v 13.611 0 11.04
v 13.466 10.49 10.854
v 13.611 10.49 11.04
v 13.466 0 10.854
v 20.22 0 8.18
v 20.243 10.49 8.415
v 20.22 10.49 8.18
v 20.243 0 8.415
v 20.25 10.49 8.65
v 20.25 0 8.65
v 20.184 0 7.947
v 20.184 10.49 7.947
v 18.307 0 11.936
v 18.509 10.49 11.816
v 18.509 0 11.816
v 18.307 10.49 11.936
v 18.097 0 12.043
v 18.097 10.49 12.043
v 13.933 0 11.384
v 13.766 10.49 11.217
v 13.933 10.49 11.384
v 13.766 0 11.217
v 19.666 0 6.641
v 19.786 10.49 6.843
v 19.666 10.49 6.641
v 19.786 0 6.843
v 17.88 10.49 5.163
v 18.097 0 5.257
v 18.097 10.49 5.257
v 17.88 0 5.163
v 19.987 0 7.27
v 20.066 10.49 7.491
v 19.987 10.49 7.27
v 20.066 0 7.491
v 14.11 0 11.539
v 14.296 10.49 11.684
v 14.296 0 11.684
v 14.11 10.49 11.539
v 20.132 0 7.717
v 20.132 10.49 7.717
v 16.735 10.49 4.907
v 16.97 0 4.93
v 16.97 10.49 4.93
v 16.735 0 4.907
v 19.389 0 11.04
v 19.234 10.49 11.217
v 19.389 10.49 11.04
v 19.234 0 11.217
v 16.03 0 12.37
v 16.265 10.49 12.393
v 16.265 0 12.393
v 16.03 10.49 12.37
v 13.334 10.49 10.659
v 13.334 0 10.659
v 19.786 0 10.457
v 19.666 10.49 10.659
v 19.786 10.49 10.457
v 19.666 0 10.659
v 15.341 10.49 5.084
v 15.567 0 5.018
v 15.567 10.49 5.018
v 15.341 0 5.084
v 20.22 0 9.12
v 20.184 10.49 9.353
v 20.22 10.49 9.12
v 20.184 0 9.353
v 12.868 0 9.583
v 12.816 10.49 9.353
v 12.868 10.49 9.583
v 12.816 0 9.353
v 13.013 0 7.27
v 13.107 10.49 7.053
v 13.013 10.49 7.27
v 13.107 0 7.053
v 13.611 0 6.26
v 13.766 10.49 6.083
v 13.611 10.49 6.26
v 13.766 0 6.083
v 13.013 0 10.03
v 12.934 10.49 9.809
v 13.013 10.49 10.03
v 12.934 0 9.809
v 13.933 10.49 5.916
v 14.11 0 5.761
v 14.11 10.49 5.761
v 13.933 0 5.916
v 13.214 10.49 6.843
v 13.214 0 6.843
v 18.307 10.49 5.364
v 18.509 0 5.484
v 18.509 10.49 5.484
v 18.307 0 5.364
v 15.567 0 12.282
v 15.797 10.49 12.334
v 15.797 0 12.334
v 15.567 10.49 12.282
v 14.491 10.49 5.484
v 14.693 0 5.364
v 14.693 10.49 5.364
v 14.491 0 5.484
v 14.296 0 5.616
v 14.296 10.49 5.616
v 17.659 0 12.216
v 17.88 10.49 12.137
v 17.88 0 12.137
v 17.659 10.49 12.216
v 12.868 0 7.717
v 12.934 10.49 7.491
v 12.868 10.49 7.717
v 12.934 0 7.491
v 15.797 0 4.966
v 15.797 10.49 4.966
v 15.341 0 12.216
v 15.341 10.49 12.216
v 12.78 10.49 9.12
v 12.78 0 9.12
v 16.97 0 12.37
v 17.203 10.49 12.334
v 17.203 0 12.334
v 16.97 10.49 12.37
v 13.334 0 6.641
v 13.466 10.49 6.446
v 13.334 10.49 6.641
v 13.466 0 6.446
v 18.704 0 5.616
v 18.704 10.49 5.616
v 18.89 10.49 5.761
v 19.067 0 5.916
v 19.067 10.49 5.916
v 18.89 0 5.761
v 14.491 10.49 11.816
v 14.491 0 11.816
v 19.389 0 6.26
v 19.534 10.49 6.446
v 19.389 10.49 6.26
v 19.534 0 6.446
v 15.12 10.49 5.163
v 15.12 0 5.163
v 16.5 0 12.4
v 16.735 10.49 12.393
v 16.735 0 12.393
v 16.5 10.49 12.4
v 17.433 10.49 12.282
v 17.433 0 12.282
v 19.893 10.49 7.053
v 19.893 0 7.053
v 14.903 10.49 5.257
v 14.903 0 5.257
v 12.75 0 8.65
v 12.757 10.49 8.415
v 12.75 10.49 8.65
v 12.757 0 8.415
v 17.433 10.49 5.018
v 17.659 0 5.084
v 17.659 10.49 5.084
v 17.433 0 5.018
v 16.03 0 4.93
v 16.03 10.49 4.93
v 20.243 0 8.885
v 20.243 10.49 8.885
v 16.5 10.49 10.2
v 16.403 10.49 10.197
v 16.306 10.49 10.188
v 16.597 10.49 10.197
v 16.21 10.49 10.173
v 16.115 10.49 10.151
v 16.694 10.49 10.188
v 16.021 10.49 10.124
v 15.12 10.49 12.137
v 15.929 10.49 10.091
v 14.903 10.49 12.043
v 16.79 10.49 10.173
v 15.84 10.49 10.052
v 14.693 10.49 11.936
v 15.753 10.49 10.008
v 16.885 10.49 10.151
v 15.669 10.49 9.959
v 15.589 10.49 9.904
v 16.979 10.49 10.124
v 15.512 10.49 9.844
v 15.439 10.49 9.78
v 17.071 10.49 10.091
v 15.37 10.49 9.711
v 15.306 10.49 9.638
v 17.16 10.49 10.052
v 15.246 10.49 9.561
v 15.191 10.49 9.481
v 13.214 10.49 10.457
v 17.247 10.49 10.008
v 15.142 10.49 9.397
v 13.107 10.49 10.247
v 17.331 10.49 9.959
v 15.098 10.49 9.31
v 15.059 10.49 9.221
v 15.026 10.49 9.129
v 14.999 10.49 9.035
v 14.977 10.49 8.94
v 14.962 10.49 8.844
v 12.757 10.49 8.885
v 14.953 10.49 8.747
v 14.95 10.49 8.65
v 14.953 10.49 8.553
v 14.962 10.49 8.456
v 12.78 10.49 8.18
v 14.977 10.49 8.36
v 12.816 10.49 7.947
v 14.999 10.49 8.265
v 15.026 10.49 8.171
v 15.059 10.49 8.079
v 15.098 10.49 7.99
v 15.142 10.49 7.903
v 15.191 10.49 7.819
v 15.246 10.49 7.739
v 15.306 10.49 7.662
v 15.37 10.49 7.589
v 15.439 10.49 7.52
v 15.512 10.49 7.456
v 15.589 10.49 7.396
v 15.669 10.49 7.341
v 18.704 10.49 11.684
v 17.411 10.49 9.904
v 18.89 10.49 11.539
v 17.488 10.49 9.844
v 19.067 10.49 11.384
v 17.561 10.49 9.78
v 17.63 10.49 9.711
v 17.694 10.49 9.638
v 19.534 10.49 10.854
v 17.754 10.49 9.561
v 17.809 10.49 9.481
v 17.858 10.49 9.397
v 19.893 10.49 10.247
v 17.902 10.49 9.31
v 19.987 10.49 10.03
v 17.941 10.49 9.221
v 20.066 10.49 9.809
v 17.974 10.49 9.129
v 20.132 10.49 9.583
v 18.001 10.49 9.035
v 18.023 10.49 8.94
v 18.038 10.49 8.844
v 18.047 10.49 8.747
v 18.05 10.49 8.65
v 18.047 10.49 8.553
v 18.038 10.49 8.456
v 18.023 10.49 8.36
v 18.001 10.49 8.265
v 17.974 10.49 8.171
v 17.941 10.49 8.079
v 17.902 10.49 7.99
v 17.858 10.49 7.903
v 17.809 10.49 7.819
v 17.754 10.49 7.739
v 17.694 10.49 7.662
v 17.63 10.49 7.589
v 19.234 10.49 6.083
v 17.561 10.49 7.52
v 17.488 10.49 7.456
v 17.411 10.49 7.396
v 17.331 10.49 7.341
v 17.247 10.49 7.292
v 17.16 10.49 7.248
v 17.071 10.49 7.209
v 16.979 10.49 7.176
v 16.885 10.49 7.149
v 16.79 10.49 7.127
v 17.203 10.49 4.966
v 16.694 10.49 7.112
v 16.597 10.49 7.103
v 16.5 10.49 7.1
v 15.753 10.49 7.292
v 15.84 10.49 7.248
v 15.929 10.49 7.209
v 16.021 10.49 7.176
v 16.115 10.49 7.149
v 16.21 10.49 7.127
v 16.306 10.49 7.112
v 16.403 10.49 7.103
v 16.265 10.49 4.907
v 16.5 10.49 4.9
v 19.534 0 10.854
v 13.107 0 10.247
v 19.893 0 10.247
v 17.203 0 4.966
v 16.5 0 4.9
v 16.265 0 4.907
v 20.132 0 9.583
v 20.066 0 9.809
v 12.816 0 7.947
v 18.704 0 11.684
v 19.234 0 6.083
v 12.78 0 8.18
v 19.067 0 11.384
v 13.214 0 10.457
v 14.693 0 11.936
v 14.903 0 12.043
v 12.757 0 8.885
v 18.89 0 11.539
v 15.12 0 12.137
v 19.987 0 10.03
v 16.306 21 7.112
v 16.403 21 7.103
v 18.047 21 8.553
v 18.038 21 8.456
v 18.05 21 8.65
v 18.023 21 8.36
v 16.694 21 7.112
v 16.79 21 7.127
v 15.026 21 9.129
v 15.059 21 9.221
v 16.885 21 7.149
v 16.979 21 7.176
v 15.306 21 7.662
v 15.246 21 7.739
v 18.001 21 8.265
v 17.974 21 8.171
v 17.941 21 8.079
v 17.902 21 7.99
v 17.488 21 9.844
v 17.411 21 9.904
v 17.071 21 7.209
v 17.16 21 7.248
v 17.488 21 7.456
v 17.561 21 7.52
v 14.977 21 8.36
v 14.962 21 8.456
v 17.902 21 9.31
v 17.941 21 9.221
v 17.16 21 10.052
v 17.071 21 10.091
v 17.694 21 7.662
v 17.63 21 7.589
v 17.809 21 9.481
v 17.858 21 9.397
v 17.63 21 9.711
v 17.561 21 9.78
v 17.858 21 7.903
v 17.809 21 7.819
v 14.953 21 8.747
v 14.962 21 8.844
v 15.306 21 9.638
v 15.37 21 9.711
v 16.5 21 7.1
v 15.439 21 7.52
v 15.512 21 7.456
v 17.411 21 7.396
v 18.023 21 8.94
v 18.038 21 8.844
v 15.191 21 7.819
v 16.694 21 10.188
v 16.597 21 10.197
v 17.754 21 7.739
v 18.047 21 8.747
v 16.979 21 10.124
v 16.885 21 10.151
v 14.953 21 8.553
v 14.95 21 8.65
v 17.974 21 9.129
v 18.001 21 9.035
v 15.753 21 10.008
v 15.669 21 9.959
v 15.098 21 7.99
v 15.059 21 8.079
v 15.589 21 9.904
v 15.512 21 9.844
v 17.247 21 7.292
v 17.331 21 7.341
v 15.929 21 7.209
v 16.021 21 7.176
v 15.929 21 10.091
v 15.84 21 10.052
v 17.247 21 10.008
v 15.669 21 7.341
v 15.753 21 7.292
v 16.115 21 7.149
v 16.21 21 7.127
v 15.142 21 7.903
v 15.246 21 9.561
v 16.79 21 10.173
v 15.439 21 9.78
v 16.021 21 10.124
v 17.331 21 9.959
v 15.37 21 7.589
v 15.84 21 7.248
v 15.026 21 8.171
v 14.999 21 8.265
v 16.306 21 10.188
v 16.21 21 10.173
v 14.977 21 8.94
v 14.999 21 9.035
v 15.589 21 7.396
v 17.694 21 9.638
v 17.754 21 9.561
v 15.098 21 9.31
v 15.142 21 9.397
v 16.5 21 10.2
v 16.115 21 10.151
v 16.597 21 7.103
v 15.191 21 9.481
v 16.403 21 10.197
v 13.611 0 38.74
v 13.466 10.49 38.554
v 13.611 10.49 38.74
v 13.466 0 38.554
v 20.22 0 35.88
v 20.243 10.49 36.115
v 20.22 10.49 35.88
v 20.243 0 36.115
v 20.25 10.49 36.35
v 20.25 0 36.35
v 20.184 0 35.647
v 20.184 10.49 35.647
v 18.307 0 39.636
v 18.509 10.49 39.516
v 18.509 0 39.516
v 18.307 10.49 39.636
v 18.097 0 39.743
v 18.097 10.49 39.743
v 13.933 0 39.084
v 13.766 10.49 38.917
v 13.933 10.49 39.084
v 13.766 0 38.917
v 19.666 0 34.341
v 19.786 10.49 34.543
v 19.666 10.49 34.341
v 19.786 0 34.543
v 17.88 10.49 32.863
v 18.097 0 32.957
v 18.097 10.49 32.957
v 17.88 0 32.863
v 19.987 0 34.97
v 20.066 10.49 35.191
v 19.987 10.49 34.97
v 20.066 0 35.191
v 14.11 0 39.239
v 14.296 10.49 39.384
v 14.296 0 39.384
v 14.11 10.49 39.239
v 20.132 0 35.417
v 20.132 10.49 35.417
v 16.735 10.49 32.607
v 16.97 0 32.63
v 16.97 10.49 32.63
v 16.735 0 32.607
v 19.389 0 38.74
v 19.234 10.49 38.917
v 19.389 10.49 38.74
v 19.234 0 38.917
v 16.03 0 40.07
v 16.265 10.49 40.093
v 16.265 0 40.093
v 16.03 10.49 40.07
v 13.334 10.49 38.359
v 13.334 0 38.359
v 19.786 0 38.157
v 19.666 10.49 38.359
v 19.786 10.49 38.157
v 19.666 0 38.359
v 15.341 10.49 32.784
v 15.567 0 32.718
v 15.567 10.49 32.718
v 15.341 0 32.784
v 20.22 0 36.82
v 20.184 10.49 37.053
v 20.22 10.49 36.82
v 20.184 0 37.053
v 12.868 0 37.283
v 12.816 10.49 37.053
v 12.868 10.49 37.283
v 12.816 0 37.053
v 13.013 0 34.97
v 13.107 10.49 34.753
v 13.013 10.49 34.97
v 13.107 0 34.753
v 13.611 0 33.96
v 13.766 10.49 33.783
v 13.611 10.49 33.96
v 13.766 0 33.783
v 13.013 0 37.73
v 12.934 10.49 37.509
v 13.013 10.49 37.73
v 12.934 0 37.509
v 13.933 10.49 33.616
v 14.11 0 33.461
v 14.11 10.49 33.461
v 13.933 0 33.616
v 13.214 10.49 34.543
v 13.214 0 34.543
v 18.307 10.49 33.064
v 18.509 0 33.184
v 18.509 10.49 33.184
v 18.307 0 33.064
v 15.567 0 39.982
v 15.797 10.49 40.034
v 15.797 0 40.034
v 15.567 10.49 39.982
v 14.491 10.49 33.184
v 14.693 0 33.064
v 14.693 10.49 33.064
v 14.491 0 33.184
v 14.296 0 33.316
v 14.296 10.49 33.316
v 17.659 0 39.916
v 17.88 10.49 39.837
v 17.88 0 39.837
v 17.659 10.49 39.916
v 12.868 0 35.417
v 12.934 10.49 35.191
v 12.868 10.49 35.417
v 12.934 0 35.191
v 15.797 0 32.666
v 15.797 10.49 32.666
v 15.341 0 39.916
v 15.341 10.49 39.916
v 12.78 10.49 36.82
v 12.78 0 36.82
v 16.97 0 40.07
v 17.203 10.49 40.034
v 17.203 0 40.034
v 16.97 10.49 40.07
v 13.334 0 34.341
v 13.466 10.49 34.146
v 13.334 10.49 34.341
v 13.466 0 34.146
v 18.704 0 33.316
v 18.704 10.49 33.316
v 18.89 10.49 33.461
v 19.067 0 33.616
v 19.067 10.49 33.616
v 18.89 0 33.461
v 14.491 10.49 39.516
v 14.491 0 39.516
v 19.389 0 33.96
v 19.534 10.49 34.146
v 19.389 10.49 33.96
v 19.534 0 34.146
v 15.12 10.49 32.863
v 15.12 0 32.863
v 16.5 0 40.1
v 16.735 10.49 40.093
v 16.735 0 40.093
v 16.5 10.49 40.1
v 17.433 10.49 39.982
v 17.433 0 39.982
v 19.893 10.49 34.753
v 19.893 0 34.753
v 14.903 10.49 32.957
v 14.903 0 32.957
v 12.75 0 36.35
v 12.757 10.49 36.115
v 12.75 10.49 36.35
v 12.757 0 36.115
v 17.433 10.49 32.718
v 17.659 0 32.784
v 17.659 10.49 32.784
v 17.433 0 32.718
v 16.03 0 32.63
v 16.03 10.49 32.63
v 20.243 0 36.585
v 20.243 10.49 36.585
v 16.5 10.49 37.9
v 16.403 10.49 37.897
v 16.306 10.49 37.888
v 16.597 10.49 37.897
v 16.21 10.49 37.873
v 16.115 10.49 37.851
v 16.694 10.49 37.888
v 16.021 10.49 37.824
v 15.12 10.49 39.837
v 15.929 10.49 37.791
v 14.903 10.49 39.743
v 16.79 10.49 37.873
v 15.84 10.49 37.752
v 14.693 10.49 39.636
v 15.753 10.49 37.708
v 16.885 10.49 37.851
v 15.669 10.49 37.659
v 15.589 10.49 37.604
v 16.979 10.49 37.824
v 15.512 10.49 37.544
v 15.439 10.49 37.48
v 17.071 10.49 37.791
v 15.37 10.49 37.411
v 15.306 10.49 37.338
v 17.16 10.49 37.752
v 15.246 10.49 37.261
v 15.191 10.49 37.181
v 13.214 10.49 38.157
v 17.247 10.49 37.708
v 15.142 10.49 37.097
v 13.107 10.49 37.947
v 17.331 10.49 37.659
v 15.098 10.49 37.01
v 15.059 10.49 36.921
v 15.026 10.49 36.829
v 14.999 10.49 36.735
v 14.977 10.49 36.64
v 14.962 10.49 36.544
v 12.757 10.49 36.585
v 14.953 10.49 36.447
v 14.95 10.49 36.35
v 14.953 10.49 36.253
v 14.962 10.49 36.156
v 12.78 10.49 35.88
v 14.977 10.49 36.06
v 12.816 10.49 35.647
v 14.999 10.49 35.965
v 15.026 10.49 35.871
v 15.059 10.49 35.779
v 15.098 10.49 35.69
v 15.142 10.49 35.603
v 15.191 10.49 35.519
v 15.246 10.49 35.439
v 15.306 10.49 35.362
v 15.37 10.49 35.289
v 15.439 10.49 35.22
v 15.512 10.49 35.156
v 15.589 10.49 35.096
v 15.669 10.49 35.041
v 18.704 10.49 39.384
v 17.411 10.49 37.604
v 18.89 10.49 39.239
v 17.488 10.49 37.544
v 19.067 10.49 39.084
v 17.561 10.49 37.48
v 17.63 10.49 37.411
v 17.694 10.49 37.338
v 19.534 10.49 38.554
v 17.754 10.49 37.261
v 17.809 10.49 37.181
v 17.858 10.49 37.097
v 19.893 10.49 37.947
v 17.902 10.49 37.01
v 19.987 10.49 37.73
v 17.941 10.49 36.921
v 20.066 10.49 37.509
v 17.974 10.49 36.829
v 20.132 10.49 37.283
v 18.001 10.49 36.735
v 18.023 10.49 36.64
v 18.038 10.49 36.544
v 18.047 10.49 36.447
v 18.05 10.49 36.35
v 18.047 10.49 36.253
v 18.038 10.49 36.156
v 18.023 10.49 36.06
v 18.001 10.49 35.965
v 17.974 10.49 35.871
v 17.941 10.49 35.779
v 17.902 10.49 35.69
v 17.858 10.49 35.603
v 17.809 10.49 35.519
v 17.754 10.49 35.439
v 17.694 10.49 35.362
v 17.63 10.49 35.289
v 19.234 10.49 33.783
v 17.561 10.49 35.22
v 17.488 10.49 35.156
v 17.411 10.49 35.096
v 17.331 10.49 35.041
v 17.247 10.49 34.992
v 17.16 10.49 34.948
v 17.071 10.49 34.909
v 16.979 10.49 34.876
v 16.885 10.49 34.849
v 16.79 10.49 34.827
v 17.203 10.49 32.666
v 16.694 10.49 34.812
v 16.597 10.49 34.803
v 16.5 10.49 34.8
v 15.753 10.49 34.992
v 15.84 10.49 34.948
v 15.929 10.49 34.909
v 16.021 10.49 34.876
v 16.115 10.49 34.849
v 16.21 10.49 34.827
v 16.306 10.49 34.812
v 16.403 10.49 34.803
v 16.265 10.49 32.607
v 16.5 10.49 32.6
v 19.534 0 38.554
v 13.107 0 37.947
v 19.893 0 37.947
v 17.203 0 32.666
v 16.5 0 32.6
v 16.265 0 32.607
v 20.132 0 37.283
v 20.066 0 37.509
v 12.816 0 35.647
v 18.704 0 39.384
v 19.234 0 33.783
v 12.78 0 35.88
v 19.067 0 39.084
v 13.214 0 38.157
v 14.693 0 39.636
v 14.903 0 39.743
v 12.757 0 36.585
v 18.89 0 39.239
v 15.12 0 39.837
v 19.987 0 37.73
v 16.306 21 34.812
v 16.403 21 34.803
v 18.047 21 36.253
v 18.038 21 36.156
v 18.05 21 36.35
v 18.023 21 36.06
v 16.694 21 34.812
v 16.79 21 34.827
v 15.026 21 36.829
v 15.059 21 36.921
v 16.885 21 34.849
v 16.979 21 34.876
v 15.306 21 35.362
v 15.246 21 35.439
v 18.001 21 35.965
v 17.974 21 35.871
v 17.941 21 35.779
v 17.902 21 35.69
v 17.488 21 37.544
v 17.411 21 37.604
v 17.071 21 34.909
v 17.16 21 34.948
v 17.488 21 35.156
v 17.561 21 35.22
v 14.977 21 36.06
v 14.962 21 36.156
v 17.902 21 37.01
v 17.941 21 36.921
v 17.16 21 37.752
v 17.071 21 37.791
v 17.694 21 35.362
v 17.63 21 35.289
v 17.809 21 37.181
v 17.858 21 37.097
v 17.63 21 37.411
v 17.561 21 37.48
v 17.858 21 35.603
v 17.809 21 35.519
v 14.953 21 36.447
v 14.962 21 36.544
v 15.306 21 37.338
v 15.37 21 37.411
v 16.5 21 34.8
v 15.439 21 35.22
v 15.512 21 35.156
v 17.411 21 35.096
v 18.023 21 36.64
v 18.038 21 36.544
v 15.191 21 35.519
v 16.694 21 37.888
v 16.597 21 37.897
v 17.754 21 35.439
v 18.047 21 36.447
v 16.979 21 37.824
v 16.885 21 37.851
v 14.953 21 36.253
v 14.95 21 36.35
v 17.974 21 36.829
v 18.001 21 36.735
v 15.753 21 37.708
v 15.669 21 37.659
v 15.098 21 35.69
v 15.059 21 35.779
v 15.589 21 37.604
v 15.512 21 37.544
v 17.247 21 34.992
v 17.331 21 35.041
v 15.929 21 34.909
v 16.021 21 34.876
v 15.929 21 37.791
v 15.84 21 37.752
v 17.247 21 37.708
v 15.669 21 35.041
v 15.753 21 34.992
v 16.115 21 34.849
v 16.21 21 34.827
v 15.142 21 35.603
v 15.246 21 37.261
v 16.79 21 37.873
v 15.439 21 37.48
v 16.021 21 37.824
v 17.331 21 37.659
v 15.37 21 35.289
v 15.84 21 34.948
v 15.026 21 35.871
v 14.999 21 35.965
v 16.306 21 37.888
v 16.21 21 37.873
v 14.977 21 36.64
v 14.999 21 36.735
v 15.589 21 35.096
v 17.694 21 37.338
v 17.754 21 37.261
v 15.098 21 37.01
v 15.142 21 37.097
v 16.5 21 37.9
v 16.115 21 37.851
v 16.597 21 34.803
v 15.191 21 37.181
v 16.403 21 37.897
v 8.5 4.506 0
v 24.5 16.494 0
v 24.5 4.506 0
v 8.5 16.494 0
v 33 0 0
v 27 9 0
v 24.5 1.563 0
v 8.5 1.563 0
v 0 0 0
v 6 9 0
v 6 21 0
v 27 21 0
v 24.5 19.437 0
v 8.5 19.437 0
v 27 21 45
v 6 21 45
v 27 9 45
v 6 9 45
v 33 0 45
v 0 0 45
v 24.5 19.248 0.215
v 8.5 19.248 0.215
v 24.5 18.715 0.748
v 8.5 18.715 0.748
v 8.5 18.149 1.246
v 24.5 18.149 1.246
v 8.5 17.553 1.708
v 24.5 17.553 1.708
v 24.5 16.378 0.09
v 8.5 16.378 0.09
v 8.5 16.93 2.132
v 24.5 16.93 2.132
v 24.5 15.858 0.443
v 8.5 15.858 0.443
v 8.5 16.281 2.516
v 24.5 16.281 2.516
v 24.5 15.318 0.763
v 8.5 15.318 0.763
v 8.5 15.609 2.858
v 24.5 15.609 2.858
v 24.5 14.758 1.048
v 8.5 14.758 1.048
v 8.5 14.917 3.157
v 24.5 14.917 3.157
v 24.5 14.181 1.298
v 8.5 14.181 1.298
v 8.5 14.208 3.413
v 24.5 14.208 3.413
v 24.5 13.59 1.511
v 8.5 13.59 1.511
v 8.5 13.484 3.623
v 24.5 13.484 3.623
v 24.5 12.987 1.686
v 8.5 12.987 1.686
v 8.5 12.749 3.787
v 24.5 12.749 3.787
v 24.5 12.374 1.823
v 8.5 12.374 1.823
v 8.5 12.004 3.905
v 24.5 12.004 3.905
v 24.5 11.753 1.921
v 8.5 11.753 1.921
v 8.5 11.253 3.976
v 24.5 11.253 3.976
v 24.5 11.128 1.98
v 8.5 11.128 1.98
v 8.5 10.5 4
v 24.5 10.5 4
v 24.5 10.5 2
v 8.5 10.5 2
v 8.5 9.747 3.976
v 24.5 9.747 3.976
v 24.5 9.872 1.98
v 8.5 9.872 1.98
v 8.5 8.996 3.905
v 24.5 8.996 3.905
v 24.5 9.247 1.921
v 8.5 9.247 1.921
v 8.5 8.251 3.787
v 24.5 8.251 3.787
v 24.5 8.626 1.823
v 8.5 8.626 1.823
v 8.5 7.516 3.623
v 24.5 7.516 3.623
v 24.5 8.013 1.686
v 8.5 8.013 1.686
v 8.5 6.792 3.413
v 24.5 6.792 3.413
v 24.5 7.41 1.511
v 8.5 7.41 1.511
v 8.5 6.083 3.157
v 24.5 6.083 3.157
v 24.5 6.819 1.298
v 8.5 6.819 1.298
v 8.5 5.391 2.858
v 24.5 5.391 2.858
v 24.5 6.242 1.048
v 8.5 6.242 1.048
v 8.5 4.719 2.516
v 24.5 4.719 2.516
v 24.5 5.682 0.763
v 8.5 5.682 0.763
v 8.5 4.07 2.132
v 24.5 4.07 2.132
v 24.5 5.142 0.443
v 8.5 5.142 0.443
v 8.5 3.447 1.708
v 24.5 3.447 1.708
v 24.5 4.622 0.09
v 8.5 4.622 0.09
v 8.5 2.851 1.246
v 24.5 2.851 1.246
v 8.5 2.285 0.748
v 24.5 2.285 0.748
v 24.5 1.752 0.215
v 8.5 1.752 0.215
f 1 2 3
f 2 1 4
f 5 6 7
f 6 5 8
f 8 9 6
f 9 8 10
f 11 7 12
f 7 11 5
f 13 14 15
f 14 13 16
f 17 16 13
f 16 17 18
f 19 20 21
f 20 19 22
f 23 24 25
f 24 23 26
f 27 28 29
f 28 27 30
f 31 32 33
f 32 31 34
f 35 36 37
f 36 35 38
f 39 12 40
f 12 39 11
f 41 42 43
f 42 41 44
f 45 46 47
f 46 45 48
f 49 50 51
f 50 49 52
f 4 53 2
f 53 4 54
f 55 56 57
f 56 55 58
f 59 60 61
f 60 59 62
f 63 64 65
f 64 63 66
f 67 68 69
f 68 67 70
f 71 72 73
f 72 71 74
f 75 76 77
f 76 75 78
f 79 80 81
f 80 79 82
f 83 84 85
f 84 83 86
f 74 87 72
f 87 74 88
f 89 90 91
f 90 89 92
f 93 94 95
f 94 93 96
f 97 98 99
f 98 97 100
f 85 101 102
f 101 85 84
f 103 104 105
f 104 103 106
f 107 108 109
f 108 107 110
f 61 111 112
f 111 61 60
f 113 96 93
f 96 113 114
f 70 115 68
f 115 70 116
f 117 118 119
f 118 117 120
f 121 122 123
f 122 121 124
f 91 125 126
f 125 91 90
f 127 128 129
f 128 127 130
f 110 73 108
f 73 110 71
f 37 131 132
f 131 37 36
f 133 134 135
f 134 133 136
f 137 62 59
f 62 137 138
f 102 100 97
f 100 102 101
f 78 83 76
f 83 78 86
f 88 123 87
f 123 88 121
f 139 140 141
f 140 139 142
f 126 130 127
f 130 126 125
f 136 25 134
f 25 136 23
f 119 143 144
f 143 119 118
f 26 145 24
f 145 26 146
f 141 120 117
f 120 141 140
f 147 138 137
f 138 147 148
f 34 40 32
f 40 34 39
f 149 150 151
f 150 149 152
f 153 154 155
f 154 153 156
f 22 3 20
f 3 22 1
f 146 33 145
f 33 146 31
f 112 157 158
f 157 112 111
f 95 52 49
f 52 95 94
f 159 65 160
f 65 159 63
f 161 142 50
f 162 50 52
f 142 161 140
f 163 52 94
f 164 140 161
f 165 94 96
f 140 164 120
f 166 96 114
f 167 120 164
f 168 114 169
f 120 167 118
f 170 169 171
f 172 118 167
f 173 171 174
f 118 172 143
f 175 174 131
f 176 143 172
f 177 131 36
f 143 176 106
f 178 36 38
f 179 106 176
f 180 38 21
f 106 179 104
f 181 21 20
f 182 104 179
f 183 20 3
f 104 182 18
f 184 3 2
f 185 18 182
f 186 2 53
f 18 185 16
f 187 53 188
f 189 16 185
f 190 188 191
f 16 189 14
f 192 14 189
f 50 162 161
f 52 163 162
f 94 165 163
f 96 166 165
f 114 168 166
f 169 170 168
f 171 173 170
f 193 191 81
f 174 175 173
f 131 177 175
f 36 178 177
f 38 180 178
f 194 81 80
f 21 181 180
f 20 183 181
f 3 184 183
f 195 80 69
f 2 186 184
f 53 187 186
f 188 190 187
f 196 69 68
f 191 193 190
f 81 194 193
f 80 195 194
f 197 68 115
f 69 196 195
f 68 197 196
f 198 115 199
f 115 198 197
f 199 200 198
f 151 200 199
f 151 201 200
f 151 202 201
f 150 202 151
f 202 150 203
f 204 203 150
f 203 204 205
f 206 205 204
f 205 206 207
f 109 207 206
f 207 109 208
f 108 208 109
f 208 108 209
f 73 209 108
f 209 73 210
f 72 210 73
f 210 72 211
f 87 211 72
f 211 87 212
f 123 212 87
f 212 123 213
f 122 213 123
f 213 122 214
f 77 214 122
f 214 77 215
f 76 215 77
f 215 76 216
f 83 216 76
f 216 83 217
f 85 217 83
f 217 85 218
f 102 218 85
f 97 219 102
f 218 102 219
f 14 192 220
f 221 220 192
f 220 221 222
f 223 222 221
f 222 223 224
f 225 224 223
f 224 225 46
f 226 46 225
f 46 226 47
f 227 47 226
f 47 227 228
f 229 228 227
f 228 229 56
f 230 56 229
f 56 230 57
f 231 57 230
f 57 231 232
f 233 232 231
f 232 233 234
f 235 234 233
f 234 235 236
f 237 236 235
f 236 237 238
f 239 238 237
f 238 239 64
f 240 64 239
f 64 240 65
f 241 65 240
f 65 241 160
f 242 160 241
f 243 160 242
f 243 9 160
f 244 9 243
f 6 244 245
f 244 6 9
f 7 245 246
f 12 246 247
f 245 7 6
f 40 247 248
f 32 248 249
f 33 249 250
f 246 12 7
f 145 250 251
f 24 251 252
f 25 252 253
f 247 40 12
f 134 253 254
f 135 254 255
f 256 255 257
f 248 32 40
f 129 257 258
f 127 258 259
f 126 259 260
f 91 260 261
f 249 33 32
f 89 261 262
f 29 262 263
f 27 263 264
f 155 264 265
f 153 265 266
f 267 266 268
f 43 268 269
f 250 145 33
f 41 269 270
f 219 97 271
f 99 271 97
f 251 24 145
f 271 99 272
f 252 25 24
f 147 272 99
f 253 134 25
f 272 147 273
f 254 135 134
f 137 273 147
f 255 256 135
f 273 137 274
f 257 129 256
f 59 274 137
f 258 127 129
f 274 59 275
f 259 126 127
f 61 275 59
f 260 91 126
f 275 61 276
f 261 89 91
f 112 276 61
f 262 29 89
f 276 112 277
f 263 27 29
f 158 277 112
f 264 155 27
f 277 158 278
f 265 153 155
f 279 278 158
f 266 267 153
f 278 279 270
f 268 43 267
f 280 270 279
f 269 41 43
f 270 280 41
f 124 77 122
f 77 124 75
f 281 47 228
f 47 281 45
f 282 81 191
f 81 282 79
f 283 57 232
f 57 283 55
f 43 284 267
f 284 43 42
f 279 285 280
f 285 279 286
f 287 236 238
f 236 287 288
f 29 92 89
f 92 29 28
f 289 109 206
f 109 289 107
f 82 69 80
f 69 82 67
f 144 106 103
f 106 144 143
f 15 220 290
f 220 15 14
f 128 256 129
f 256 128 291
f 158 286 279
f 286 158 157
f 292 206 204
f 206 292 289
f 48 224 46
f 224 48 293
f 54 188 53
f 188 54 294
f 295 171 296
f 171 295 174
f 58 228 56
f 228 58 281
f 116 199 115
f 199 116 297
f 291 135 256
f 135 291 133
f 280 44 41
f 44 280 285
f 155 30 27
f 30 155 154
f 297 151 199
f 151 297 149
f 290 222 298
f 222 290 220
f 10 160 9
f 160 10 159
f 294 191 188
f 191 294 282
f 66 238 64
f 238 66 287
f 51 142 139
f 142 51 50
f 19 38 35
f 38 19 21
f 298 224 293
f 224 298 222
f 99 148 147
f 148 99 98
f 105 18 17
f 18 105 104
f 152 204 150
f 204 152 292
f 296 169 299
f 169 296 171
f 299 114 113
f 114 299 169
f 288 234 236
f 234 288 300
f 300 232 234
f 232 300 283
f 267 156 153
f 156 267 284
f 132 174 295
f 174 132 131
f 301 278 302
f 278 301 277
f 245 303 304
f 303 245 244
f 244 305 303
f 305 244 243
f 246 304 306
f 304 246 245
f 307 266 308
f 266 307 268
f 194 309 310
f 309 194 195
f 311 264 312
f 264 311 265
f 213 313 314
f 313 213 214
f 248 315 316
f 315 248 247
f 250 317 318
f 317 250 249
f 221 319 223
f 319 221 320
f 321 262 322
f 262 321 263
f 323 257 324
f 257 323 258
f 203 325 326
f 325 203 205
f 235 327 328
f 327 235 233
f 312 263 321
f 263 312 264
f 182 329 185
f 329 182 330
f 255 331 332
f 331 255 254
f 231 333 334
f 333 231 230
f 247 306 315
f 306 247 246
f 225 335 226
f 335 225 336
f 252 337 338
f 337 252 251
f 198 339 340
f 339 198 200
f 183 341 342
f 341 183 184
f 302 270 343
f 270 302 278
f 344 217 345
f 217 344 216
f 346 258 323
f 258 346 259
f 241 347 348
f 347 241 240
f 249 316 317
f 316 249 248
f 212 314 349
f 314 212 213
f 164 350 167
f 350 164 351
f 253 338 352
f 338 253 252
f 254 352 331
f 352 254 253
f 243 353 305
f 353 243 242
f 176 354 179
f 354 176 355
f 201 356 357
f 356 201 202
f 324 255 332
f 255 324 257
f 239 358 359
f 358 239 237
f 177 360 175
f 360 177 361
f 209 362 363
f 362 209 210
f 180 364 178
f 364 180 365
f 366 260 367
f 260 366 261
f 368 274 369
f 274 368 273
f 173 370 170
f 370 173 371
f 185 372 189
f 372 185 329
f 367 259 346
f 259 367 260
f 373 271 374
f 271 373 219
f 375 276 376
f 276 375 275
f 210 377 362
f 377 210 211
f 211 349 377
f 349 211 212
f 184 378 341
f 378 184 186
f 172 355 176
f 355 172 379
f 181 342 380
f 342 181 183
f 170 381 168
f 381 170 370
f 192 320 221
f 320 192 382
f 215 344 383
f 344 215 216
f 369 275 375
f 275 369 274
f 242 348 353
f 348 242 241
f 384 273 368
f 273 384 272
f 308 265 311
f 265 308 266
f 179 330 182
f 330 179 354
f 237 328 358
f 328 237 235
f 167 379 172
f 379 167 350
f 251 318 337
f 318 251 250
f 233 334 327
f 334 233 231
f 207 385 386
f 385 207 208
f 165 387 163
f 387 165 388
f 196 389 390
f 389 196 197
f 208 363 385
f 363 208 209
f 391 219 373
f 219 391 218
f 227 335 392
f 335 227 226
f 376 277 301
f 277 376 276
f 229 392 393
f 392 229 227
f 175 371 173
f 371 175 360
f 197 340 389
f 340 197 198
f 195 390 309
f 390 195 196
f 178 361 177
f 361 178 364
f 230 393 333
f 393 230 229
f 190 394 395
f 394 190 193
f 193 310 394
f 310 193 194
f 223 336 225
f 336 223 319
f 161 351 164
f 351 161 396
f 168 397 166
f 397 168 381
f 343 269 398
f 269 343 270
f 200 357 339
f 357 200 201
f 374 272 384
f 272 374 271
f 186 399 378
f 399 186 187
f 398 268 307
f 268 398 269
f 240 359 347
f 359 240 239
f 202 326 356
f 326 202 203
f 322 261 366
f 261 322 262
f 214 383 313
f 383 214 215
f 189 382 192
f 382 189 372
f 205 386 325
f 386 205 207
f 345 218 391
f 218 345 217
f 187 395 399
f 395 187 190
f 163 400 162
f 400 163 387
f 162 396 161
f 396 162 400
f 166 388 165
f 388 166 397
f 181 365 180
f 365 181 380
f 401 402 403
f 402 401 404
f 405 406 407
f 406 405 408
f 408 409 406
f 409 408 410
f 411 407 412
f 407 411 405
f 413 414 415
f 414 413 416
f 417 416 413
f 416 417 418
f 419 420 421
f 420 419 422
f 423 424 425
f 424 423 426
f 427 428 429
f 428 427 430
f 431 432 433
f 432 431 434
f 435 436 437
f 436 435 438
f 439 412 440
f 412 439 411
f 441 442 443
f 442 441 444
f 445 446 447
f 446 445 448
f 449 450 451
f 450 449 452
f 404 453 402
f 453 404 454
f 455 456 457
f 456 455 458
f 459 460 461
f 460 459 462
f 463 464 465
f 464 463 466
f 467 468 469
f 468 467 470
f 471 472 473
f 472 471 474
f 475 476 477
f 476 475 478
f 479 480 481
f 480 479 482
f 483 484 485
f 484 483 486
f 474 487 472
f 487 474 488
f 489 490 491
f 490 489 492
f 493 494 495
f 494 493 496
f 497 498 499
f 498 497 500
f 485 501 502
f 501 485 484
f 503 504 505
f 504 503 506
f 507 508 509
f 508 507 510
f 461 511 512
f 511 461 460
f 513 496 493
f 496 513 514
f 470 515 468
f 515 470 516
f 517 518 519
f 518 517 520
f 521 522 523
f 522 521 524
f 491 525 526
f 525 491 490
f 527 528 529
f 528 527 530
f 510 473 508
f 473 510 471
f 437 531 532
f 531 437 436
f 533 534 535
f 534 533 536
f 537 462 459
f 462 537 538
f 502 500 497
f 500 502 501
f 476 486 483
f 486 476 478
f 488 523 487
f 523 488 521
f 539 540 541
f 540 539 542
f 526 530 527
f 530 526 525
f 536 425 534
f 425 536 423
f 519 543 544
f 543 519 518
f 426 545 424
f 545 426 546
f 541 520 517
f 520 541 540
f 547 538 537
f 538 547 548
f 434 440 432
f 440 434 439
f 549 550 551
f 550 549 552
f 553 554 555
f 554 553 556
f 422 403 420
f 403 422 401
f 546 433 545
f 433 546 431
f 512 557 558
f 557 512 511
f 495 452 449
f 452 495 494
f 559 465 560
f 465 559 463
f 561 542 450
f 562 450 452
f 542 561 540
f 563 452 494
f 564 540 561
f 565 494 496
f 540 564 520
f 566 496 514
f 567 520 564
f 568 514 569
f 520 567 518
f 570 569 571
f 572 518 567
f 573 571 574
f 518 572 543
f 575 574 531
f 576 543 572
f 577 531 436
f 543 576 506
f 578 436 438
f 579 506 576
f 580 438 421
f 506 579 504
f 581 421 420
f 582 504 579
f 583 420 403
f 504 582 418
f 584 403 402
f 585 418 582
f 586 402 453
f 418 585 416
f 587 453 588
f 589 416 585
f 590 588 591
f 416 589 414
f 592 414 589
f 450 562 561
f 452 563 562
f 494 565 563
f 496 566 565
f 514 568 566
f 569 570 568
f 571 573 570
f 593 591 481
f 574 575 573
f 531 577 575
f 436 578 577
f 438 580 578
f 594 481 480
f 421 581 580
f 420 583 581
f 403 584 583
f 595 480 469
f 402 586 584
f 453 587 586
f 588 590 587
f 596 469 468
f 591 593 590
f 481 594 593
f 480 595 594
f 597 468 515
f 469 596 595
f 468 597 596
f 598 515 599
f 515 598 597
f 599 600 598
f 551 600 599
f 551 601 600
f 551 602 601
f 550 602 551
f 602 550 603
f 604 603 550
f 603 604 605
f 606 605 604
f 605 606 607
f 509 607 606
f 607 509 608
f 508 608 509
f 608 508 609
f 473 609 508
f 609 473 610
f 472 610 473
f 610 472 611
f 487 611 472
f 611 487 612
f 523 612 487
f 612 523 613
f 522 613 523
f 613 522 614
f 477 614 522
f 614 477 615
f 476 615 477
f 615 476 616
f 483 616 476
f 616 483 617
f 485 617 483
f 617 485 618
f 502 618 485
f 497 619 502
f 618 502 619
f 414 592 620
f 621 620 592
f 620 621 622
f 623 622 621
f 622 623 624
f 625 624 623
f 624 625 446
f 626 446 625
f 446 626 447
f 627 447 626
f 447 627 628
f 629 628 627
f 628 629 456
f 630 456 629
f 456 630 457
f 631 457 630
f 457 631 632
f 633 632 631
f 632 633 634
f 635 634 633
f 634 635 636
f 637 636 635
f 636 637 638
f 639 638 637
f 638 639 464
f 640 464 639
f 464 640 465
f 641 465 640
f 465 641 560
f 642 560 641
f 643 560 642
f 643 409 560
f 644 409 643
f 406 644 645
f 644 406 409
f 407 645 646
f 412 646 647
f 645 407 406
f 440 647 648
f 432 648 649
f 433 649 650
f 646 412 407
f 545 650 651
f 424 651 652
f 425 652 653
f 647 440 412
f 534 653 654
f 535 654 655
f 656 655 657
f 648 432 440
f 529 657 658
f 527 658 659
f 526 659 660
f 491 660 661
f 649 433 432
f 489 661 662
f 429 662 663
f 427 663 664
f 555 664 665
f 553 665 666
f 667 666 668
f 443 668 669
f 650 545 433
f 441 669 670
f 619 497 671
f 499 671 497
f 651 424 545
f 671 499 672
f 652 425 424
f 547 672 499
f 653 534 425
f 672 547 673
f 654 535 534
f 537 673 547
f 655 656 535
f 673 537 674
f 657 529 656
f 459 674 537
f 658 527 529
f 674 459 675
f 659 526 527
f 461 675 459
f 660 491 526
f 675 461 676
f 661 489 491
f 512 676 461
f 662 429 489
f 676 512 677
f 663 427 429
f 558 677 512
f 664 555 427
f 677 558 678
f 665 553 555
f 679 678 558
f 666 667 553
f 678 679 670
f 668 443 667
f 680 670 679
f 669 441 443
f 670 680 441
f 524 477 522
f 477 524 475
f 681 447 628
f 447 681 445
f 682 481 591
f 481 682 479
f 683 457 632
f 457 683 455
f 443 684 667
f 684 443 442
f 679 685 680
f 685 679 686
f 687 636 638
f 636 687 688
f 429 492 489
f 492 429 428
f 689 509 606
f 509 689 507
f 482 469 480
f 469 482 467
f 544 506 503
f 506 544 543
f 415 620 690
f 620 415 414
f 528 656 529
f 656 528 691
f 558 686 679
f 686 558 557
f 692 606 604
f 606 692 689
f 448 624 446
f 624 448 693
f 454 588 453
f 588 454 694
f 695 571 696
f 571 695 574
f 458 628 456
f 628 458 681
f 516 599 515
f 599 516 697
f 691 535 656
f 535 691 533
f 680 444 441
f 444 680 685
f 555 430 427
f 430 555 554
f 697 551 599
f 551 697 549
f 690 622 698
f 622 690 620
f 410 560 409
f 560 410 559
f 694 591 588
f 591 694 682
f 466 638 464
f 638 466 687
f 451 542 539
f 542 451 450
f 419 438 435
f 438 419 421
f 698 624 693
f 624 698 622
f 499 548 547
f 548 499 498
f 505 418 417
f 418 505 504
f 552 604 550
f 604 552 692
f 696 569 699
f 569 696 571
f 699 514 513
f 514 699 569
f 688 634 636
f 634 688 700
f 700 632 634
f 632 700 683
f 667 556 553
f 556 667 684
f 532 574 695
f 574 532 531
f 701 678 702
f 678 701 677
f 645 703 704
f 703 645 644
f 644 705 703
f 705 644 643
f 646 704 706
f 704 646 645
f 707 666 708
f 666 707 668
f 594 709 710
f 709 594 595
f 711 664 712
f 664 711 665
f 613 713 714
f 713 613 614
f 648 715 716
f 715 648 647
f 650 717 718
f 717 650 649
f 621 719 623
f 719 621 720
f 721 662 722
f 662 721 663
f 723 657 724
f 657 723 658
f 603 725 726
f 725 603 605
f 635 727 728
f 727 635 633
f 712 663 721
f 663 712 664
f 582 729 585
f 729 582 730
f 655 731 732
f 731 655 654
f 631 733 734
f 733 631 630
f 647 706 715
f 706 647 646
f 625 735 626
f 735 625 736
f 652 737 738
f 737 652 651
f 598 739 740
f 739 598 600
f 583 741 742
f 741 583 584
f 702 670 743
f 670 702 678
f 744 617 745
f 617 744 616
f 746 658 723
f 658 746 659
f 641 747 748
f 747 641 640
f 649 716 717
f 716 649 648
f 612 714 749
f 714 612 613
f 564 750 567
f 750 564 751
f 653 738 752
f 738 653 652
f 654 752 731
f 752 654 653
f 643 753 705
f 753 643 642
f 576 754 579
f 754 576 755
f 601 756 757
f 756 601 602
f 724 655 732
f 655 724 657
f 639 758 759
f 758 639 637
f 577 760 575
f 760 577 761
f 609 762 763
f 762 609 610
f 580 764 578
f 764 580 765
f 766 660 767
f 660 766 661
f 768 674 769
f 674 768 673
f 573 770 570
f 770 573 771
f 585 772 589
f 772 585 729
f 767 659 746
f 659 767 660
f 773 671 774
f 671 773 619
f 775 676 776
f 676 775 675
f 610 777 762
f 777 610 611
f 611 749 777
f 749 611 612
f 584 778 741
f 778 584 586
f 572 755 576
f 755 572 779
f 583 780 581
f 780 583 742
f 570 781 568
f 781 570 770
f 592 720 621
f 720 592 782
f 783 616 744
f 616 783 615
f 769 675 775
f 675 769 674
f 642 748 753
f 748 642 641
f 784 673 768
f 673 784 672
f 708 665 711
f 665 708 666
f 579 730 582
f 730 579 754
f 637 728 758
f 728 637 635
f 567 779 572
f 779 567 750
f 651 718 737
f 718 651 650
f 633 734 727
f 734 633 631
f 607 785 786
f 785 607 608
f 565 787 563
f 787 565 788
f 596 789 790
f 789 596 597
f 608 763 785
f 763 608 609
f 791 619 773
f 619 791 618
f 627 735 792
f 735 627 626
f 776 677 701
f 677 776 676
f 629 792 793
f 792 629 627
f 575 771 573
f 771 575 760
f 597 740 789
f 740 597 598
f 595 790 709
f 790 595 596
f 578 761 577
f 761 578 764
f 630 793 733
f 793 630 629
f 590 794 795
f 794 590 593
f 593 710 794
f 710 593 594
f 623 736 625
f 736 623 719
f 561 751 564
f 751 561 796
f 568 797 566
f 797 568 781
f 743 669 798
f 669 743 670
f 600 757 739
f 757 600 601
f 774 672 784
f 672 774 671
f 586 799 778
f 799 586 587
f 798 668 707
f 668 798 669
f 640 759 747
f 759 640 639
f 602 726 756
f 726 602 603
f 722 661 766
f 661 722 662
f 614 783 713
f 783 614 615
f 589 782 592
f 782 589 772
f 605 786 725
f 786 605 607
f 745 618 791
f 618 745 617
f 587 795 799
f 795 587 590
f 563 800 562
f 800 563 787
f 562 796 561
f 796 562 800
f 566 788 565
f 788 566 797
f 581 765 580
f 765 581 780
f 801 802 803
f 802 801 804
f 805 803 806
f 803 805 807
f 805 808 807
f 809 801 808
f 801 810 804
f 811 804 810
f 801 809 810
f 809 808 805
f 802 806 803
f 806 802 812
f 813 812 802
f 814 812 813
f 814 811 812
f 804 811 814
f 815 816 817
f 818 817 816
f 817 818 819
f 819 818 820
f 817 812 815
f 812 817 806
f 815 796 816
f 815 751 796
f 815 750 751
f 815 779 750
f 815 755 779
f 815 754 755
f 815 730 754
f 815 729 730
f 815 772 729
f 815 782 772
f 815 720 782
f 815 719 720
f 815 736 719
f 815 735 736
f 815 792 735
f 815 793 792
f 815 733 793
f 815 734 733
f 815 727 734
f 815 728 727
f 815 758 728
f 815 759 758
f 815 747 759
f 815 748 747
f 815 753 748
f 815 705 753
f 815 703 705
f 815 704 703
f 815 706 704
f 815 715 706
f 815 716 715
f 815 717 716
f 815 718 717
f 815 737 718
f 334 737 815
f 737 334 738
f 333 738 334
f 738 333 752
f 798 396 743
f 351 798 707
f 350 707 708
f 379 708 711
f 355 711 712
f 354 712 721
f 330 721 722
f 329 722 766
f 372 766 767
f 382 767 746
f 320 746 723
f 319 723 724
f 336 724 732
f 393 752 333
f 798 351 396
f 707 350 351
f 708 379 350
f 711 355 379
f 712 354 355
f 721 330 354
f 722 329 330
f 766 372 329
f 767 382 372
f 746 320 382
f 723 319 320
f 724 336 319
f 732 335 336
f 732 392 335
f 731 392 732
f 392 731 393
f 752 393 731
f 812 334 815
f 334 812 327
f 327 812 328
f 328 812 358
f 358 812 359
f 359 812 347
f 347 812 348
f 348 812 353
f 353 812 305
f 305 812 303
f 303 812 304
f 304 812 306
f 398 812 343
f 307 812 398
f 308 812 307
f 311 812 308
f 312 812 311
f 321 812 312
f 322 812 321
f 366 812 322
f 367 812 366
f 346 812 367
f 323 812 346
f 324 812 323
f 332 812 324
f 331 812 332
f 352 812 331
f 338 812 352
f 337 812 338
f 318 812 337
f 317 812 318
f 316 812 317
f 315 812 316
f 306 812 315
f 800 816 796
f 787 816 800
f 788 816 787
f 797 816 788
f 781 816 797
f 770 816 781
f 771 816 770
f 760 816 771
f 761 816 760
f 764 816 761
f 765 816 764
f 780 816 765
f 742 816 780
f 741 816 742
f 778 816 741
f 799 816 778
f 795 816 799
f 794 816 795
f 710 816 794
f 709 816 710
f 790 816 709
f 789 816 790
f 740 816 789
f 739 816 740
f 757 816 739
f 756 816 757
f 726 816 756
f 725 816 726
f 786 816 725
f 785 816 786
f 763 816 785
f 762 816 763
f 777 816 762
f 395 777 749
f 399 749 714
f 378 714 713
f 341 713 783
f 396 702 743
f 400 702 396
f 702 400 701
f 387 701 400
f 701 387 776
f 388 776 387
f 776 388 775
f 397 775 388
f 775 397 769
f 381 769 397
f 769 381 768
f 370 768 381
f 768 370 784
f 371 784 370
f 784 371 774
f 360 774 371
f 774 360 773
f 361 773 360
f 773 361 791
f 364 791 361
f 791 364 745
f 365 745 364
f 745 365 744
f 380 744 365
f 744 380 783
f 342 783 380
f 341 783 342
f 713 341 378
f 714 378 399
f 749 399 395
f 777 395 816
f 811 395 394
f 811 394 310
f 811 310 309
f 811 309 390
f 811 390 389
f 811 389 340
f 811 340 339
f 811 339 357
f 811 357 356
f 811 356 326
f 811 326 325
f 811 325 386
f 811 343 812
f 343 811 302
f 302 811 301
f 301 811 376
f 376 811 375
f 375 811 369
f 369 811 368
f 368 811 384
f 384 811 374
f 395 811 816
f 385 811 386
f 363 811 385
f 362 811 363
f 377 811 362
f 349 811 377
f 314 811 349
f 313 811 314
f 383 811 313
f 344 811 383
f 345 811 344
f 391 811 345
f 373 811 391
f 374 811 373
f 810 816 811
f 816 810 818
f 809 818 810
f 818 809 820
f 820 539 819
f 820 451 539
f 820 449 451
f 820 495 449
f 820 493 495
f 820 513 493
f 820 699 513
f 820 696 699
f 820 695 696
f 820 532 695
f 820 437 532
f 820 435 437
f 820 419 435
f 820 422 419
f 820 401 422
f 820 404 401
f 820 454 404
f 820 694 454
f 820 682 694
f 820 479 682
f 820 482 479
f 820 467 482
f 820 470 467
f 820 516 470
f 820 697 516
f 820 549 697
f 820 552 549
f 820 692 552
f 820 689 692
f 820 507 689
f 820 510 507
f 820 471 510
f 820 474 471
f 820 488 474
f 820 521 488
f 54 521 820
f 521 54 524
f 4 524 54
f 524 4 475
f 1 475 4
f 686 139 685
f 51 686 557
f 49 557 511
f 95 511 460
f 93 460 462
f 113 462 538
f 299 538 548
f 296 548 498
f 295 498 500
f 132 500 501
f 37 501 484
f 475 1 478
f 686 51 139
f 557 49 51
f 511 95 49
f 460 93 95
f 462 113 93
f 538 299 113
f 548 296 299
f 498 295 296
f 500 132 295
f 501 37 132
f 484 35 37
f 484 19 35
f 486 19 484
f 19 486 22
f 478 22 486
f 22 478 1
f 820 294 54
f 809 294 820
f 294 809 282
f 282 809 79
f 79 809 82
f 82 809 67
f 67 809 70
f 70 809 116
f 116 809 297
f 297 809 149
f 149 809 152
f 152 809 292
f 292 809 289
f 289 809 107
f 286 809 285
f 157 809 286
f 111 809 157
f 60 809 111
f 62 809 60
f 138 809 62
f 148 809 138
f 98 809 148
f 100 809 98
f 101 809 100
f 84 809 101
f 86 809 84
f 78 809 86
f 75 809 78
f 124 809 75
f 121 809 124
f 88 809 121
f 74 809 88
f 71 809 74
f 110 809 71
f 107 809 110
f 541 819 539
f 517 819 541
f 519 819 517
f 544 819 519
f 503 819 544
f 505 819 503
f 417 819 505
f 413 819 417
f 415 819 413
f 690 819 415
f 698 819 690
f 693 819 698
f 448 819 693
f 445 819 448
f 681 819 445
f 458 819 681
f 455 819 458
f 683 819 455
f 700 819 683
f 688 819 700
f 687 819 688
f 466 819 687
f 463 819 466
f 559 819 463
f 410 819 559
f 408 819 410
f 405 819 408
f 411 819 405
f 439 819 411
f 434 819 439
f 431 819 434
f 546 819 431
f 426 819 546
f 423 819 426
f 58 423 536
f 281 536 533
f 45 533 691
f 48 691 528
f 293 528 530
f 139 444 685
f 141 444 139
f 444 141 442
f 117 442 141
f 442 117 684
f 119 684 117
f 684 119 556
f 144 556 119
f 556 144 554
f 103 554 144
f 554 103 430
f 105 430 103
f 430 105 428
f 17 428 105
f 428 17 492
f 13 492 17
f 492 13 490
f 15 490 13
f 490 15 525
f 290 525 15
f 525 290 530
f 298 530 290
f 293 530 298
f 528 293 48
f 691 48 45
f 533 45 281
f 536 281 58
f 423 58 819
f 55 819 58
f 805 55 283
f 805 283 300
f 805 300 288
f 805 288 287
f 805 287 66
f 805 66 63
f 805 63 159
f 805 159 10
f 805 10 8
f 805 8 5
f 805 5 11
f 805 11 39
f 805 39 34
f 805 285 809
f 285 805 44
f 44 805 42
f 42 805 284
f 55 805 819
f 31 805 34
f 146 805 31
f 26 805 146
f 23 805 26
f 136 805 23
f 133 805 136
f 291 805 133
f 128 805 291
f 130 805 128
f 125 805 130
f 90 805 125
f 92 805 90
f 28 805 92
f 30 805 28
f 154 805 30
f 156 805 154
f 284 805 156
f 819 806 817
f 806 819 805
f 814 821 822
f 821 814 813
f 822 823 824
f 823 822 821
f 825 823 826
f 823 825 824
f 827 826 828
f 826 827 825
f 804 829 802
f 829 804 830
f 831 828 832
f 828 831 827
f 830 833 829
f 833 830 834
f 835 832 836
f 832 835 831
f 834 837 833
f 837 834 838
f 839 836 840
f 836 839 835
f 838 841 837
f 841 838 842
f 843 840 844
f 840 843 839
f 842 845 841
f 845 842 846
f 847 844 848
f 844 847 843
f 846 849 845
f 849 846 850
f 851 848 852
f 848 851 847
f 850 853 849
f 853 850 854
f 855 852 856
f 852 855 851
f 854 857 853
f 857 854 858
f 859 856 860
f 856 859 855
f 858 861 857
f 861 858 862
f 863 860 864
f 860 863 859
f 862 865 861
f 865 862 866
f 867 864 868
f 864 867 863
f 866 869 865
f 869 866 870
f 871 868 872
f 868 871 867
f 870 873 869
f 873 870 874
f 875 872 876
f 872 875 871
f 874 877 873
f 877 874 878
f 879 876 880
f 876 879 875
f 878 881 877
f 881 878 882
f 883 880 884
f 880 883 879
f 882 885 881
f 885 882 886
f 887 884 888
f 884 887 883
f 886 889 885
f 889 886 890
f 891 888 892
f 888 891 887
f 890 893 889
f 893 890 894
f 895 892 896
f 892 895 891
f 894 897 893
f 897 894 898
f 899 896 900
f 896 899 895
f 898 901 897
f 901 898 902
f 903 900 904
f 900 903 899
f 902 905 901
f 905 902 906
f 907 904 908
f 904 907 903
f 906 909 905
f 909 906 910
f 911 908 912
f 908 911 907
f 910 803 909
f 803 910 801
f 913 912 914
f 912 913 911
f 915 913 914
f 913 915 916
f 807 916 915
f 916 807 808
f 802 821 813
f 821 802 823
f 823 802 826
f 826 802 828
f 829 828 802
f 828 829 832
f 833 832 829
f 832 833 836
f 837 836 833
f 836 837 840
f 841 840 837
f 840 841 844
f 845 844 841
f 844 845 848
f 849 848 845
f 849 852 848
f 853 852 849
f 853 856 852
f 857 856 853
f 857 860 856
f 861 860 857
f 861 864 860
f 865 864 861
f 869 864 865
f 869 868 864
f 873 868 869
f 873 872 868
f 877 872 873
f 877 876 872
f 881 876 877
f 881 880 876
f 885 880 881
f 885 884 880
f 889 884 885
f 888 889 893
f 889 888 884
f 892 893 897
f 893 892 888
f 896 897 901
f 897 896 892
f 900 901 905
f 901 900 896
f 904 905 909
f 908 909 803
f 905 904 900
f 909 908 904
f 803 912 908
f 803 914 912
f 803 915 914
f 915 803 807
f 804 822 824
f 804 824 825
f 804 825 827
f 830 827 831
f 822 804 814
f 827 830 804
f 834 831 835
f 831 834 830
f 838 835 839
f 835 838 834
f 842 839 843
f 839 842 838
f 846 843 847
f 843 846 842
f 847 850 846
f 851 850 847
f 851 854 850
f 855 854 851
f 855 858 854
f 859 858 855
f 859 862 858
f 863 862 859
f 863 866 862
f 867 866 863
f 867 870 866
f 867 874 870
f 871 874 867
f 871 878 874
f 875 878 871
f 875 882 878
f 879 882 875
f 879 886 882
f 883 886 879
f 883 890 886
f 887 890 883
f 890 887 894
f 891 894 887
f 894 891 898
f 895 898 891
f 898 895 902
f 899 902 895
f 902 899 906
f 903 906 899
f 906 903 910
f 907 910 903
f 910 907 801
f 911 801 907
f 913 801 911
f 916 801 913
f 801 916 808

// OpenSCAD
$fn = 100;
EPS = 1e-2;
DOVETAIL_LENGTH = 45;
DOVETAIL_BOTTOM_WIDTH = 33;
DOVETAIL_TOP_WIDTH = 21;
DOVETAIL_HEIGHT = 9;
DOVETAIL_SCREW_DISTANCE = 27.7;
DOVETAIL_EXTRA_HEIGHT = 12;
DOVETAIL_VELCRO_GAP_THICKNESS = 2;
DOVETAIL_VELCRO_GAP_WIDTH = 16;

module dovetail_mount_screw_hole() {
  total_height = DOVETAIL_HEIGHT + DOVETAIL_EXTRA_HEIGHT;
  rotate([-90, 0, 0])
    cylinder(h=total_height / 2, d=7.5);
  rotate([-90, 0, 0])
    cylinder(h=total_height * 2, d=3.1);
}

module dovetail_mount() {
  difference() {
    linear_extrude(DOVETAIL_LENGTH)
      polygon([
        [0, 0],
        [DOVETAIL_BOTTOM_WIDTH, 0],
        [DOVETAIL_BOTTOM_WIDTH / 2 + DOVETAIL_TOP_WIDTH / 2, DOVETAIL_HEIGHT],
        [DOVETAIL_BOTTOM_WIDTH / 2 + DOVETAIL_TOP_WIDTH / 2, DOVETAIL_HEIGHT + DOVETAIL_EXTRA_HEIGHT],
        [DOVETAIL_BOTTOM_WIDTH / 2 - DOVETAIL_TOP_WIDTH / 2, DOVETAIL_HEIGHT + DOVETAIL_EXTRA_HEIGHT],
        [DOVETAIL_BOTTOM_WIDTH / 2 - DOVETAIL_TOP_WIDTH / 2, DOVETAIL_HEIGHT],
      ]);
    translate([DOVETAIL_BOTTOM_WIDTH / 2, -EPS, DOVETAIL_LENGTH / 2 - DOVETAIL_SCREW_DISTANCE / 2])
      dovetail_mount_screw_hole();
    translate([DOVETAIL_BOTTOM_WIDTH / 2, -EPS, DOVETAIL_LENGTH / 2 + DOVETAIL_SCREW_DISTANCE / 2])
      dovetail_mount_screw_hole();

    translate([-DOVETAIL_VELCRO_GAP_WIDTH/2 + DOVETAIL_BOTTOM_WIDTH/2, (DOVETAIL_HEIGHT + DOVETAIL_EXTRA_HEIGHT)/2, -8])
      rotate([0, 0, 90])
      rotate([90, 0, 0])
      rotate_extrude(angle=180)
      translate([10, 0, 0])
      square([DOVETAIL_VELCRO_GAP_THICKNESS, DOVETAIL_VELCRO_GAP_WIDTH]);
  }
}

dovetail_mount();
